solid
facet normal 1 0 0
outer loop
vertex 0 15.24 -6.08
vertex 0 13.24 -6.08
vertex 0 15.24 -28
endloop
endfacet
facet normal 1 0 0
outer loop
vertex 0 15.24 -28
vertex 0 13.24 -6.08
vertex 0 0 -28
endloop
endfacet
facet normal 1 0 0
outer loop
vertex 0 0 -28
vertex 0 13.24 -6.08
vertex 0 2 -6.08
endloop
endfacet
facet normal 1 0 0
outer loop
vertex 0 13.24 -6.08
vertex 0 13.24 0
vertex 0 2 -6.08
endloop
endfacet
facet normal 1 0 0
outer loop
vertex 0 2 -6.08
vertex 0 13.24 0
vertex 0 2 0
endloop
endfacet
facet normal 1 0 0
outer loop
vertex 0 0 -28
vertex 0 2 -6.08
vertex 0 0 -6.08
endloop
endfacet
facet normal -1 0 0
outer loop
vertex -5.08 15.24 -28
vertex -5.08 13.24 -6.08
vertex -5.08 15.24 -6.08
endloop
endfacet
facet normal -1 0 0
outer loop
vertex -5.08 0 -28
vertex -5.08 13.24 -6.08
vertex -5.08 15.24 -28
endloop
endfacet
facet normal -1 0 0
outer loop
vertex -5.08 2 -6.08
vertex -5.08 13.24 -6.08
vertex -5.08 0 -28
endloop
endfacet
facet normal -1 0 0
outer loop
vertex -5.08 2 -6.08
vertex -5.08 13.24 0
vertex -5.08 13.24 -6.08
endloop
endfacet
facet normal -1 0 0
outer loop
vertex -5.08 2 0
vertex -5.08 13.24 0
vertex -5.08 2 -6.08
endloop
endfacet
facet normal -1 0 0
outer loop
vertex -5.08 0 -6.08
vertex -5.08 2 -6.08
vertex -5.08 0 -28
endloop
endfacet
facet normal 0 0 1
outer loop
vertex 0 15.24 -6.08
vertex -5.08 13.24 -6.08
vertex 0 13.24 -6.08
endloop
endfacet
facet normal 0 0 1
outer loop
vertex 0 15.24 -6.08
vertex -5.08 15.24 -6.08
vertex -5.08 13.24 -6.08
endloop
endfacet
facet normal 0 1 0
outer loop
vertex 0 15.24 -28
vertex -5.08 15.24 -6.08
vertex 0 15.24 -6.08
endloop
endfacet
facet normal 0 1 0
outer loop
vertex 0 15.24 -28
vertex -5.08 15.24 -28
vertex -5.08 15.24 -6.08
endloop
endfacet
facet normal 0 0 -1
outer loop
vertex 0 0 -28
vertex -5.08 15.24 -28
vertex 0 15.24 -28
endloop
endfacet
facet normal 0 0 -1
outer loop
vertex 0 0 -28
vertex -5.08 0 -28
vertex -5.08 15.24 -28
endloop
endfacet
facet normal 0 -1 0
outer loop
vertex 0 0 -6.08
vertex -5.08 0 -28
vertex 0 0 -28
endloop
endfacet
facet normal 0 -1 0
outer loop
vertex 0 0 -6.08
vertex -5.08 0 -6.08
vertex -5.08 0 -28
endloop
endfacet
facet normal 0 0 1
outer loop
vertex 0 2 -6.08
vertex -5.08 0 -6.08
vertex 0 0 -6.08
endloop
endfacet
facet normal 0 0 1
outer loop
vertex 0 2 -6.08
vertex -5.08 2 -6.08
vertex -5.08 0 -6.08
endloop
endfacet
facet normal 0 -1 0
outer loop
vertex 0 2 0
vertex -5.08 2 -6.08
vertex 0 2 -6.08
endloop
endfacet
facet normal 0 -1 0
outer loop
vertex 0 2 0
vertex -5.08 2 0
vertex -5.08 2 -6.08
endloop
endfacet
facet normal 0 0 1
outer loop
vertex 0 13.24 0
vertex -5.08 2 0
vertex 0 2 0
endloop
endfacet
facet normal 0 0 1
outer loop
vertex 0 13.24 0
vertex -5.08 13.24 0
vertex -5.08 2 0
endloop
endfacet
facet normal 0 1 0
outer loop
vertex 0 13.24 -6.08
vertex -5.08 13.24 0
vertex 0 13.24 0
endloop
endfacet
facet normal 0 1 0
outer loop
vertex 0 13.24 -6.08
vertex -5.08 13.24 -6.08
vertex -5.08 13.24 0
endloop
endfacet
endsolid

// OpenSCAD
module bedleg(cw_w = 5.08, cw_h = 15.24, mirror = true, leglength=28,leg_angle=0) 
{
    translate([-cw_w/2,0, -cw_w/2]) 
    rotate([0,leg_angle,0])
    translate([cw_w/2,0, cw_w/2]) 
    {
        if (mirror) 
        {
            translate([-cw_w,0,-leglength]) color([0.40,0.30,0.16,1.0])
                oneleg(cw_w, cw_h, leglength);
        }
        else {
            translate([0,0,-leglength]) color([0.40,0.30,0.16,1.0])
                oneleg(cw_w, cw_h, leglength);

        } 
    }
}

module oneleg(cw_w = 5.08, cw_h = 15.24, leglength=28)
{
    indent_w = 2;
    indent_h = cw_w + 1;
    //cube([cw_w, cw_h, leglength],center=false);
    
    translate([cw_w,0,leglength])
    rotate([-90,0,90])
    linear_extrude(cw_w)
    polygon(points=[[indent_w,0],[cw_h-indent_w,0],[cw_h-indent_w, indent_h],[cw_h, indent_h],[cw_h, leglength],[0,leglength],[0,indent_h], [indent_w,indent_h]]);
}    

bedleg();
